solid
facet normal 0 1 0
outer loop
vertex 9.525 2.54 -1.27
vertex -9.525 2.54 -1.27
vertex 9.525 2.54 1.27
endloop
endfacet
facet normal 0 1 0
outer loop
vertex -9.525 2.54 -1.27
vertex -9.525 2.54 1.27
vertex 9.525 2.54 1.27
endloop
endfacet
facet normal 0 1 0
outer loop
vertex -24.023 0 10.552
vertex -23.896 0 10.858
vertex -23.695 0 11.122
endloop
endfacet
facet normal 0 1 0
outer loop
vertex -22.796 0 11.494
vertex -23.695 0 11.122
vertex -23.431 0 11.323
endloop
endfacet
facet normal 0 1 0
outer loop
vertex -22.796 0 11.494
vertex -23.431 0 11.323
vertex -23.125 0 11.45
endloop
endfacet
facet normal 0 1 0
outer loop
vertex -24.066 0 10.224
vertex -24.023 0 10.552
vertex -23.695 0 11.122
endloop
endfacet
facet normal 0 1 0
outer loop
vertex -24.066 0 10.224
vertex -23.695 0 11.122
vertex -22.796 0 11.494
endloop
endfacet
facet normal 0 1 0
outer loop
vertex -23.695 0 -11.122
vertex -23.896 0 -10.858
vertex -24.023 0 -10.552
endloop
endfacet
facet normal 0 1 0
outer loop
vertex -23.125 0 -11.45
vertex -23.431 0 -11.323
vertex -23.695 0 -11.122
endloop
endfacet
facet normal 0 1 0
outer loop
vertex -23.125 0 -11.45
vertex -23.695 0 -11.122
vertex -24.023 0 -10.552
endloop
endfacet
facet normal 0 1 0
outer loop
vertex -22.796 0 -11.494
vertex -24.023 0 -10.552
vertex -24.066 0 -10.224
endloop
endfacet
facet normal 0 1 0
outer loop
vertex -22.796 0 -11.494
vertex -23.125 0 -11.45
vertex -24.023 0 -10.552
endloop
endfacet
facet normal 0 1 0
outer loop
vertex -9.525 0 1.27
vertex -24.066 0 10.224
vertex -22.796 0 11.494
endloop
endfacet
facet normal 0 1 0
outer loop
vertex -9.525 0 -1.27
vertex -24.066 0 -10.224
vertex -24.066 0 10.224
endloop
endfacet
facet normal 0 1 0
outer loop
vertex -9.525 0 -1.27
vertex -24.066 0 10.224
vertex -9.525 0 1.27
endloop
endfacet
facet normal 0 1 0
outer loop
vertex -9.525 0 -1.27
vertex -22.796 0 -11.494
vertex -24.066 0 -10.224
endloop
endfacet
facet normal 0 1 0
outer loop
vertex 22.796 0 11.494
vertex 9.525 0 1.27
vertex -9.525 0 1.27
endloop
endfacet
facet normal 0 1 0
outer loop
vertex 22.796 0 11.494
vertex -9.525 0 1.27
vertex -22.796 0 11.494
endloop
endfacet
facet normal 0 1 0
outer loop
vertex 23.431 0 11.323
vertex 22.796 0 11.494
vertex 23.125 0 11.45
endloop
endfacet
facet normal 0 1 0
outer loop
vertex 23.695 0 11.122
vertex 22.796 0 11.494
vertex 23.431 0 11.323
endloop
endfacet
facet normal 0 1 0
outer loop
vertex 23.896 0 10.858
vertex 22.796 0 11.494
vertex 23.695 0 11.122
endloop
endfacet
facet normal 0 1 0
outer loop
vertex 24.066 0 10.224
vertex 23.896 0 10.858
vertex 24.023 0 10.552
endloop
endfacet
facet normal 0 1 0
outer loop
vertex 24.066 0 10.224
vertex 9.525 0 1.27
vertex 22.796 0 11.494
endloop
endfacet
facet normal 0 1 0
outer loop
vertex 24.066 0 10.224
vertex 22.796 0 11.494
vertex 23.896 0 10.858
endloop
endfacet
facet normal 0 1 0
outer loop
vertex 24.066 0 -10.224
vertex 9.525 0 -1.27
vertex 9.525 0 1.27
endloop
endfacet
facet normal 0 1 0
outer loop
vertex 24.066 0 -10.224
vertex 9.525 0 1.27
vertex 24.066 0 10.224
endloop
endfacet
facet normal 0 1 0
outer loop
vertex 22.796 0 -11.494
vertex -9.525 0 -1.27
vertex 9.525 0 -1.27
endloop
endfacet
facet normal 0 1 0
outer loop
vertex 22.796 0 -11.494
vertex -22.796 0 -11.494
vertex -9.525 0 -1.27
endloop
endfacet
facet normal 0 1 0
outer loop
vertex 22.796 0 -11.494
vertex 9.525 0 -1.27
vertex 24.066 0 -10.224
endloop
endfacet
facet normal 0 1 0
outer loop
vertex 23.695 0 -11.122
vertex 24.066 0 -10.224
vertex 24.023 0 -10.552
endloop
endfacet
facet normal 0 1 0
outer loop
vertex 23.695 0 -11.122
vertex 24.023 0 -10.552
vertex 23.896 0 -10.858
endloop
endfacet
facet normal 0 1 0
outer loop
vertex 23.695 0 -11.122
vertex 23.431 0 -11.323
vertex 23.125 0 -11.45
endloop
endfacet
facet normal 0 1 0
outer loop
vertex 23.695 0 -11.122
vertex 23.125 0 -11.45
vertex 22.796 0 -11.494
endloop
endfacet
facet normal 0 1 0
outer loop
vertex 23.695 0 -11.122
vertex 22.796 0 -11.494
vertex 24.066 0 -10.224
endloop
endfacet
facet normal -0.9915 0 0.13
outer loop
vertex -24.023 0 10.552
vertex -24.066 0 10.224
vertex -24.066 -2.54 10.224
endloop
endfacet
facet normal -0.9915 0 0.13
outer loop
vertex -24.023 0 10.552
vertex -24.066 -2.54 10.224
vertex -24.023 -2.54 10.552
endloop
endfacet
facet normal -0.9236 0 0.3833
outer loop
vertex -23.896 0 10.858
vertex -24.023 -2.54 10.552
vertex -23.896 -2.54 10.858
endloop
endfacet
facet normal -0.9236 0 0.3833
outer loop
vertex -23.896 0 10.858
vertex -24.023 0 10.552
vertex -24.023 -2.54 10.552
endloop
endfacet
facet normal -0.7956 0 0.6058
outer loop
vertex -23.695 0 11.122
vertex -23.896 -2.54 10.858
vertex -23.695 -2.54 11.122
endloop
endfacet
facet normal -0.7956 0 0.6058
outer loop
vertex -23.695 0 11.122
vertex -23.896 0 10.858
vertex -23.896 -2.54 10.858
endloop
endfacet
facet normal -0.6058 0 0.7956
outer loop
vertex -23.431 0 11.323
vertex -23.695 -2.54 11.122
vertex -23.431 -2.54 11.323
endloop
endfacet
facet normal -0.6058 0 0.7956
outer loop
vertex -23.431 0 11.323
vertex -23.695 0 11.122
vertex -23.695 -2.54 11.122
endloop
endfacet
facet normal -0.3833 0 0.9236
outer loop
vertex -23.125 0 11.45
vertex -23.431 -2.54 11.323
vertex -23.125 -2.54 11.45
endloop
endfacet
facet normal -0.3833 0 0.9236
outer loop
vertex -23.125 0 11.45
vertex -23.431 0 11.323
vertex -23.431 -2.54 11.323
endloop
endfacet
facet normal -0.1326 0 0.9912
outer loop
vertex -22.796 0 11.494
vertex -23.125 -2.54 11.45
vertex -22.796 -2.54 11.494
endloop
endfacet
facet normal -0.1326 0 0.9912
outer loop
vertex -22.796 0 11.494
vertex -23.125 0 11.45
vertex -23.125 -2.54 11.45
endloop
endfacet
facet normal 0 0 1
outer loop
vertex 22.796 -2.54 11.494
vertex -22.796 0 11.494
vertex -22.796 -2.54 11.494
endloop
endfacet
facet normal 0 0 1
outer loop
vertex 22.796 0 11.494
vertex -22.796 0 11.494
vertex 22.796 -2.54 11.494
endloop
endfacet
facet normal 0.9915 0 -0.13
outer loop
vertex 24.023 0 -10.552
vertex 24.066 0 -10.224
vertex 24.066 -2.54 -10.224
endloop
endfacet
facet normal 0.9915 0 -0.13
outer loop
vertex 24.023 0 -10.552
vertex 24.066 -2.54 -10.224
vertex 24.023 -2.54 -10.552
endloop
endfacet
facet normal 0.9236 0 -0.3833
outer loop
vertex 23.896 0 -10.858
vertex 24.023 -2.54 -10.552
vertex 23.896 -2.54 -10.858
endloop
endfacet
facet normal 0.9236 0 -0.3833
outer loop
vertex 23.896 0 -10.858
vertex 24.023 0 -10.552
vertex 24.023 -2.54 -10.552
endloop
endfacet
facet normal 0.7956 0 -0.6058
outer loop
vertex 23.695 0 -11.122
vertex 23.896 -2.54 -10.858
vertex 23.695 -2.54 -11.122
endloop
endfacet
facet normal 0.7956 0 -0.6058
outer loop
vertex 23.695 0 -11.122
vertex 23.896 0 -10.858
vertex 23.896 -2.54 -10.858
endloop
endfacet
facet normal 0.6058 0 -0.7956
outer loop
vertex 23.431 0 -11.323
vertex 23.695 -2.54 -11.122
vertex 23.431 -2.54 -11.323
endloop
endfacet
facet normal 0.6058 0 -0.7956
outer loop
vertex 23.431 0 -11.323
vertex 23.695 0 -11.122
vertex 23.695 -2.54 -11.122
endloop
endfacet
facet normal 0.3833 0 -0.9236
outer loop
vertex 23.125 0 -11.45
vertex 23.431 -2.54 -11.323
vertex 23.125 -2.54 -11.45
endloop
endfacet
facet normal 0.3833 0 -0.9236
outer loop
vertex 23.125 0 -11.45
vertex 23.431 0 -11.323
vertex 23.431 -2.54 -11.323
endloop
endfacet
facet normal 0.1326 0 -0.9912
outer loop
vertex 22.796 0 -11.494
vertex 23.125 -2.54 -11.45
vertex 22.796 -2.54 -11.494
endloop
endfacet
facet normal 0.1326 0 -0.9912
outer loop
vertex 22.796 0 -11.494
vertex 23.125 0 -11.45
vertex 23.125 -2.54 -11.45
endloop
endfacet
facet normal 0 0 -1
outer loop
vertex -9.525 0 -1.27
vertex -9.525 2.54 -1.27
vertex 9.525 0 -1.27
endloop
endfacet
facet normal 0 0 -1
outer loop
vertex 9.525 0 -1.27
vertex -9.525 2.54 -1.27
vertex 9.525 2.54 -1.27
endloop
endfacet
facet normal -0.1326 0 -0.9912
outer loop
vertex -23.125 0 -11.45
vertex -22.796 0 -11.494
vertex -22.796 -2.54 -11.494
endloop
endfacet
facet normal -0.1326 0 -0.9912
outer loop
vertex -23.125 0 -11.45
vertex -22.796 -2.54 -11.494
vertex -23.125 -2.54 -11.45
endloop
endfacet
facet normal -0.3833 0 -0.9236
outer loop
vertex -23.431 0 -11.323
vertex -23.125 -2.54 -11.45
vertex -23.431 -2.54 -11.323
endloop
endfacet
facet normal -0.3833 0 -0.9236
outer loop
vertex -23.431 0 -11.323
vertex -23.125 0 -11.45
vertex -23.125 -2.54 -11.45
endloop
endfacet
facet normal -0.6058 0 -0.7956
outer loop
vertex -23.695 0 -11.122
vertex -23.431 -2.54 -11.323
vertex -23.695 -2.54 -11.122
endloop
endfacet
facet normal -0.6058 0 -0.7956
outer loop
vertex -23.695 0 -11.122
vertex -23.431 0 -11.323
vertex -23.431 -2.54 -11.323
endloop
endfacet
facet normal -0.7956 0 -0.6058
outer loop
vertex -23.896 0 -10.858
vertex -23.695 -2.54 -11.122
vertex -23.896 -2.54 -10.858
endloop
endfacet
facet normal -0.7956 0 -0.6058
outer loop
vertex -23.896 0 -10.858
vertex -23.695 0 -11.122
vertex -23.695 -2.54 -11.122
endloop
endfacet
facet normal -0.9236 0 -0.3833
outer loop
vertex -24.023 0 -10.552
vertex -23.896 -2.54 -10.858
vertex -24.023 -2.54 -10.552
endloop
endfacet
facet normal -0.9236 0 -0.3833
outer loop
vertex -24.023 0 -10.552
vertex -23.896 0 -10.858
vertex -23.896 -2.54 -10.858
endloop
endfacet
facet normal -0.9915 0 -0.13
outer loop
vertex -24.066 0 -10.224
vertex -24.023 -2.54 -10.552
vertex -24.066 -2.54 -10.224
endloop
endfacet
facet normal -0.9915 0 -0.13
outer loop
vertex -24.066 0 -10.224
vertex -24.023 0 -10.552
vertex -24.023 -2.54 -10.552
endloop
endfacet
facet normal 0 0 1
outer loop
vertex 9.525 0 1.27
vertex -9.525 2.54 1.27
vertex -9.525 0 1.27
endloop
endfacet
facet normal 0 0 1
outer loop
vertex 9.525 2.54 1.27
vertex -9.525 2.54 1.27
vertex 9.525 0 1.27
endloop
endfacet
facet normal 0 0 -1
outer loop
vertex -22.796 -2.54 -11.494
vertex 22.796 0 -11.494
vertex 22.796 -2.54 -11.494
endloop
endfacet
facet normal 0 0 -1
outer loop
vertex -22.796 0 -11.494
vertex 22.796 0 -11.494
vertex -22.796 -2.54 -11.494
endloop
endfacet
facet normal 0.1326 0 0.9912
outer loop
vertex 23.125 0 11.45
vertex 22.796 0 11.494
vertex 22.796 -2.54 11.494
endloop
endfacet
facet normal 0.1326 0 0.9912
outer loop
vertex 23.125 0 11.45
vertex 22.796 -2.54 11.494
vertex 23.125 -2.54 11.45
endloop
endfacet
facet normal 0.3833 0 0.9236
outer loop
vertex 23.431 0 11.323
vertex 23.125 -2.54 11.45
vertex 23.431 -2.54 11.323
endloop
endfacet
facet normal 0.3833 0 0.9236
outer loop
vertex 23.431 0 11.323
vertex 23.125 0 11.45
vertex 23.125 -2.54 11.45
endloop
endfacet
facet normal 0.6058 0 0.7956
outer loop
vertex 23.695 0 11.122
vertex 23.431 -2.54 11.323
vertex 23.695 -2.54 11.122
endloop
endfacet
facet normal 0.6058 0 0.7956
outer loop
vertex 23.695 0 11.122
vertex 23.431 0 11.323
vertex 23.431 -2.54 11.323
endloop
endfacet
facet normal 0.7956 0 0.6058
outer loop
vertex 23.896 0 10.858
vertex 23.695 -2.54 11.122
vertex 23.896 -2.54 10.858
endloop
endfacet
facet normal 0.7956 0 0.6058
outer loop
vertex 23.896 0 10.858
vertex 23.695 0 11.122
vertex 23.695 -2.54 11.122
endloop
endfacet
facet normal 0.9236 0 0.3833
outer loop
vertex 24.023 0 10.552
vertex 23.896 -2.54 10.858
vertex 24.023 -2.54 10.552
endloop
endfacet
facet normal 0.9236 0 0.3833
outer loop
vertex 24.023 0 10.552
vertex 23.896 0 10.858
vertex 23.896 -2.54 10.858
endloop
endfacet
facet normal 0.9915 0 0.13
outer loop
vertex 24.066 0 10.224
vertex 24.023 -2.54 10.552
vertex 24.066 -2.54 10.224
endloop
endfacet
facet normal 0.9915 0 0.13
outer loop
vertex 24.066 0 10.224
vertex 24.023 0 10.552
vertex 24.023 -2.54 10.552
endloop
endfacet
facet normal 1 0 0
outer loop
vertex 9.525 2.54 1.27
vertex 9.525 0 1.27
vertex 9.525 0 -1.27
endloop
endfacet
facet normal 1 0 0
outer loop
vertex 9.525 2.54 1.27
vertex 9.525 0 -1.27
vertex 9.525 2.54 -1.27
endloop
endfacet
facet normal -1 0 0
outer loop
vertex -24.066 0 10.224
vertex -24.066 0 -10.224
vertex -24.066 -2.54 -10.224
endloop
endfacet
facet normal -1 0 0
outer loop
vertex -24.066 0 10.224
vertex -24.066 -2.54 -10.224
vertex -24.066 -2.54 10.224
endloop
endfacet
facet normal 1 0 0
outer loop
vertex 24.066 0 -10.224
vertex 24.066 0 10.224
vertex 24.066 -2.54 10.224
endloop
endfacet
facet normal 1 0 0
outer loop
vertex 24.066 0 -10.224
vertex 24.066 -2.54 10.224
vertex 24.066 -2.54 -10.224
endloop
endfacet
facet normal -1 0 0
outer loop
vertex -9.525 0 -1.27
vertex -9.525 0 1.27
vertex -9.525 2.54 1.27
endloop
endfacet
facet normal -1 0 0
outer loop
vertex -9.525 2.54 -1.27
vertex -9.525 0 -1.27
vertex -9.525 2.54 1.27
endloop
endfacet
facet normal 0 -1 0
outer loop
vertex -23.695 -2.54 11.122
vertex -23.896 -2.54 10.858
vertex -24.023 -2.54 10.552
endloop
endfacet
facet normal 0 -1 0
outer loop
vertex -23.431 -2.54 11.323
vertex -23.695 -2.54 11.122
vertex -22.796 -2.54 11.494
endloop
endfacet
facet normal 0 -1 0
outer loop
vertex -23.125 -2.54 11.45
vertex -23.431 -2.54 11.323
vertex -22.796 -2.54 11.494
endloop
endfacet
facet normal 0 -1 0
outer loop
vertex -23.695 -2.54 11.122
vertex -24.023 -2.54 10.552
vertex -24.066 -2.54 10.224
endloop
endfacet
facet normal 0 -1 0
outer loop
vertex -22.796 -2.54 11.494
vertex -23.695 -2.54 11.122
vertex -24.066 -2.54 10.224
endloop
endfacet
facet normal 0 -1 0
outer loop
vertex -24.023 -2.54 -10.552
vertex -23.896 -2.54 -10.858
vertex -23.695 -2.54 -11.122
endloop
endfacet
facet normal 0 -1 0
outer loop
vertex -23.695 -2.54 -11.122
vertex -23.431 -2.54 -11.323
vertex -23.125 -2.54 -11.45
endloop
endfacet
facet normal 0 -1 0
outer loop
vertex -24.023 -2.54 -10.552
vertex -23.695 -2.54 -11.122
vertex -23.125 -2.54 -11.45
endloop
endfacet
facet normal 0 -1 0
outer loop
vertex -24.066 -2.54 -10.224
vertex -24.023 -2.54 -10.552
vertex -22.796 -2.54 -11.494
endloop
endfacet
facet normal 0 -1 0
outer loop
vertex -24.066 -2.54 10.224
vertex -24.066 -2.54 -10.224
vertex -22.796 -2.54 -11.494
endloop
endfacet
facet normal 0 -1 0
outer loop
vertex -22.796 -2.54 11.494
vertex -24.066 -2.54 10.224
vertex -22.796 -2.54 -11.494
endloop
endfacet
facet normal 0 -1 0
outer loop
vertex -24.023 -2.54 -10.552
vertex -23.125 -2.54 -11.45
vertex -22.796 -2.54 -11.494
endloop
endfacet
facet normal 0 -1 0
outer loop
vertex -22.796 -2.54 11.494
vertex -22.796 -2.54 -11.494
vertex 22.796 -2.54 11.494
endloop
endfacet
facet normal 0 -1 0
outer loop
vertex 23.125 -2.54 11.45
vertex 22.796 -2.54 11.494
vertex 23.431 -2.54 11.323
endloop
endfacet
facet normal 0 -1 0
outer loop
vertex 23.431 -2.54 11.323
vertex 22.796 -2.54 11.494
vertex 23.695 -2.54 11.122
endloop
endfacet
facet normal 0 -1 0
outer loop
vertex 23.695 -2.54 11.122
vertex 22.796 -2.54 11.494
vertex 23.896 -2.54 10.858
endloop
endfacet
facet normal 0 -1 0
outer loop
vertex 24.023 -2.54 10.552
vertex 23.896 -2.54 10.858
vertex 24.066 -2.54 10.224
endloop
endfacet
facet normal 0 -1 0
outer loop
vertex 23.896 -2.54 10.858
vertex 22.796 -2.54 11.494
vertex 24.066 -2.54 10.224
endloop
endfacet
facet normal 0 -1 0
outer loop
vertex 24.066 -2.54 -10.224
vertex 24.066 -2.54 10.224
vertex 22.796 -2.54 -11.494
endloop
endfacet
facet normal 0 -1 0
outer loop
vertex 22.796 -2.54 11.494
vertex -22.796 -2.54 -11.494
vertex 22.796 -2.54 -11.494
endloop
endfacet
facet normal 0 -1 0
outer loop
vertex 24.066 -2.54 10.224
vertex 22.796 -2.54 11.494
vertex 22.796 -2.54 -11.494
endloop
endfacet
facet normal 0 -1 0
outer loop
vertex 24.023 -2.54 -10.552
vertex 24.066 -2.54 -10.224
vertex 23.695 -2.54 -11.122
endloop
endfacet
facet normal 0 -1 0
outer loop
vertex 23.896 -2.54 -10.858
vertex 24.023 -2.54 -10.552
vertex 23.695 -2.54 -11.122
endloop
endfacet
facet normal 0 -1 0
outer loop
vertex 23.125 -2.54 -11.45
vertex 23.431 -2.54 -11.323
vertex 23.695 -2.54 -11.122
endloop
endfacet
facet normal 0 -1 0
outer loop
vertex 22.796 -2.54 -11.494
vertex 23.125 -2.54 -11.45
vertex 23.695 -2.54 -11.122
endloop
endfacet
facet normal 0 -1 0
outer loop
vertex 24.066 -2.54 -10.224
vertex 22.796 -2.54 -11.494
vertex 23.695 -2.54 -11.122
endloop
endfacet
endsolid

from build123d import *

# Parameters (mm, degrees)
BOSS_EXTRUDE1_DEPTH = 2.54
SKETCH2_W           = 19.05
SKETCH2_H           = 2.54
BOSS_EXTRUDE2_DEPTH = 1.27


with BuildPart() as part:
    # Sketch1 → Boss-Extrude1 (new body)
    with BuildSketch(Plane(origin=(0, 0, 0), x_dir=(1, 0, 0), z_dir=(0, 1, 0))):
        with BuildLine():
            Line((-22.7965, -11.4935), (22.7965, -11.4935))
            ThreePointArc((22.7965, -11.4935), (23.694525612, -11.121525612), (24.0665, -10.2235))
            Line((24.0665, -10.2235), (24.0665, 10.2235))
            ThreePointArc((24.0665, 10.2235), (23.694525612, 11.121525612), (22.7965, 11.4935))
            Line((22.7965, 11.4935), (-22.7965, 11.4935))
            ThreePointArc((-22.7965, 11.4935), (-23.694525612, 11.121525612), (-24.0665, 10.2235))
            Line((-24.0665, 10.2235), (-24.0665, -10.2235))
            ThreePointArc((-24.0665, -10.2235), (-23.694525612, -11.121525612), (-22.7965, -11.4935))
        make_face()
    extrude(amount=-BOSS_EXTRUDE1_DEPTH)

    # Sketch2 → Boss-Extrude2 (add, symmetric)
    with BuildSketch(Plane.XY):
        with Locations((0, 1.27)):
            Rectangle(SKETCH2_W, SKETCH2_H)
    extrude(amount=BOSS_EXTRUDE2_DEPTH, both=True)


solid = part.part
